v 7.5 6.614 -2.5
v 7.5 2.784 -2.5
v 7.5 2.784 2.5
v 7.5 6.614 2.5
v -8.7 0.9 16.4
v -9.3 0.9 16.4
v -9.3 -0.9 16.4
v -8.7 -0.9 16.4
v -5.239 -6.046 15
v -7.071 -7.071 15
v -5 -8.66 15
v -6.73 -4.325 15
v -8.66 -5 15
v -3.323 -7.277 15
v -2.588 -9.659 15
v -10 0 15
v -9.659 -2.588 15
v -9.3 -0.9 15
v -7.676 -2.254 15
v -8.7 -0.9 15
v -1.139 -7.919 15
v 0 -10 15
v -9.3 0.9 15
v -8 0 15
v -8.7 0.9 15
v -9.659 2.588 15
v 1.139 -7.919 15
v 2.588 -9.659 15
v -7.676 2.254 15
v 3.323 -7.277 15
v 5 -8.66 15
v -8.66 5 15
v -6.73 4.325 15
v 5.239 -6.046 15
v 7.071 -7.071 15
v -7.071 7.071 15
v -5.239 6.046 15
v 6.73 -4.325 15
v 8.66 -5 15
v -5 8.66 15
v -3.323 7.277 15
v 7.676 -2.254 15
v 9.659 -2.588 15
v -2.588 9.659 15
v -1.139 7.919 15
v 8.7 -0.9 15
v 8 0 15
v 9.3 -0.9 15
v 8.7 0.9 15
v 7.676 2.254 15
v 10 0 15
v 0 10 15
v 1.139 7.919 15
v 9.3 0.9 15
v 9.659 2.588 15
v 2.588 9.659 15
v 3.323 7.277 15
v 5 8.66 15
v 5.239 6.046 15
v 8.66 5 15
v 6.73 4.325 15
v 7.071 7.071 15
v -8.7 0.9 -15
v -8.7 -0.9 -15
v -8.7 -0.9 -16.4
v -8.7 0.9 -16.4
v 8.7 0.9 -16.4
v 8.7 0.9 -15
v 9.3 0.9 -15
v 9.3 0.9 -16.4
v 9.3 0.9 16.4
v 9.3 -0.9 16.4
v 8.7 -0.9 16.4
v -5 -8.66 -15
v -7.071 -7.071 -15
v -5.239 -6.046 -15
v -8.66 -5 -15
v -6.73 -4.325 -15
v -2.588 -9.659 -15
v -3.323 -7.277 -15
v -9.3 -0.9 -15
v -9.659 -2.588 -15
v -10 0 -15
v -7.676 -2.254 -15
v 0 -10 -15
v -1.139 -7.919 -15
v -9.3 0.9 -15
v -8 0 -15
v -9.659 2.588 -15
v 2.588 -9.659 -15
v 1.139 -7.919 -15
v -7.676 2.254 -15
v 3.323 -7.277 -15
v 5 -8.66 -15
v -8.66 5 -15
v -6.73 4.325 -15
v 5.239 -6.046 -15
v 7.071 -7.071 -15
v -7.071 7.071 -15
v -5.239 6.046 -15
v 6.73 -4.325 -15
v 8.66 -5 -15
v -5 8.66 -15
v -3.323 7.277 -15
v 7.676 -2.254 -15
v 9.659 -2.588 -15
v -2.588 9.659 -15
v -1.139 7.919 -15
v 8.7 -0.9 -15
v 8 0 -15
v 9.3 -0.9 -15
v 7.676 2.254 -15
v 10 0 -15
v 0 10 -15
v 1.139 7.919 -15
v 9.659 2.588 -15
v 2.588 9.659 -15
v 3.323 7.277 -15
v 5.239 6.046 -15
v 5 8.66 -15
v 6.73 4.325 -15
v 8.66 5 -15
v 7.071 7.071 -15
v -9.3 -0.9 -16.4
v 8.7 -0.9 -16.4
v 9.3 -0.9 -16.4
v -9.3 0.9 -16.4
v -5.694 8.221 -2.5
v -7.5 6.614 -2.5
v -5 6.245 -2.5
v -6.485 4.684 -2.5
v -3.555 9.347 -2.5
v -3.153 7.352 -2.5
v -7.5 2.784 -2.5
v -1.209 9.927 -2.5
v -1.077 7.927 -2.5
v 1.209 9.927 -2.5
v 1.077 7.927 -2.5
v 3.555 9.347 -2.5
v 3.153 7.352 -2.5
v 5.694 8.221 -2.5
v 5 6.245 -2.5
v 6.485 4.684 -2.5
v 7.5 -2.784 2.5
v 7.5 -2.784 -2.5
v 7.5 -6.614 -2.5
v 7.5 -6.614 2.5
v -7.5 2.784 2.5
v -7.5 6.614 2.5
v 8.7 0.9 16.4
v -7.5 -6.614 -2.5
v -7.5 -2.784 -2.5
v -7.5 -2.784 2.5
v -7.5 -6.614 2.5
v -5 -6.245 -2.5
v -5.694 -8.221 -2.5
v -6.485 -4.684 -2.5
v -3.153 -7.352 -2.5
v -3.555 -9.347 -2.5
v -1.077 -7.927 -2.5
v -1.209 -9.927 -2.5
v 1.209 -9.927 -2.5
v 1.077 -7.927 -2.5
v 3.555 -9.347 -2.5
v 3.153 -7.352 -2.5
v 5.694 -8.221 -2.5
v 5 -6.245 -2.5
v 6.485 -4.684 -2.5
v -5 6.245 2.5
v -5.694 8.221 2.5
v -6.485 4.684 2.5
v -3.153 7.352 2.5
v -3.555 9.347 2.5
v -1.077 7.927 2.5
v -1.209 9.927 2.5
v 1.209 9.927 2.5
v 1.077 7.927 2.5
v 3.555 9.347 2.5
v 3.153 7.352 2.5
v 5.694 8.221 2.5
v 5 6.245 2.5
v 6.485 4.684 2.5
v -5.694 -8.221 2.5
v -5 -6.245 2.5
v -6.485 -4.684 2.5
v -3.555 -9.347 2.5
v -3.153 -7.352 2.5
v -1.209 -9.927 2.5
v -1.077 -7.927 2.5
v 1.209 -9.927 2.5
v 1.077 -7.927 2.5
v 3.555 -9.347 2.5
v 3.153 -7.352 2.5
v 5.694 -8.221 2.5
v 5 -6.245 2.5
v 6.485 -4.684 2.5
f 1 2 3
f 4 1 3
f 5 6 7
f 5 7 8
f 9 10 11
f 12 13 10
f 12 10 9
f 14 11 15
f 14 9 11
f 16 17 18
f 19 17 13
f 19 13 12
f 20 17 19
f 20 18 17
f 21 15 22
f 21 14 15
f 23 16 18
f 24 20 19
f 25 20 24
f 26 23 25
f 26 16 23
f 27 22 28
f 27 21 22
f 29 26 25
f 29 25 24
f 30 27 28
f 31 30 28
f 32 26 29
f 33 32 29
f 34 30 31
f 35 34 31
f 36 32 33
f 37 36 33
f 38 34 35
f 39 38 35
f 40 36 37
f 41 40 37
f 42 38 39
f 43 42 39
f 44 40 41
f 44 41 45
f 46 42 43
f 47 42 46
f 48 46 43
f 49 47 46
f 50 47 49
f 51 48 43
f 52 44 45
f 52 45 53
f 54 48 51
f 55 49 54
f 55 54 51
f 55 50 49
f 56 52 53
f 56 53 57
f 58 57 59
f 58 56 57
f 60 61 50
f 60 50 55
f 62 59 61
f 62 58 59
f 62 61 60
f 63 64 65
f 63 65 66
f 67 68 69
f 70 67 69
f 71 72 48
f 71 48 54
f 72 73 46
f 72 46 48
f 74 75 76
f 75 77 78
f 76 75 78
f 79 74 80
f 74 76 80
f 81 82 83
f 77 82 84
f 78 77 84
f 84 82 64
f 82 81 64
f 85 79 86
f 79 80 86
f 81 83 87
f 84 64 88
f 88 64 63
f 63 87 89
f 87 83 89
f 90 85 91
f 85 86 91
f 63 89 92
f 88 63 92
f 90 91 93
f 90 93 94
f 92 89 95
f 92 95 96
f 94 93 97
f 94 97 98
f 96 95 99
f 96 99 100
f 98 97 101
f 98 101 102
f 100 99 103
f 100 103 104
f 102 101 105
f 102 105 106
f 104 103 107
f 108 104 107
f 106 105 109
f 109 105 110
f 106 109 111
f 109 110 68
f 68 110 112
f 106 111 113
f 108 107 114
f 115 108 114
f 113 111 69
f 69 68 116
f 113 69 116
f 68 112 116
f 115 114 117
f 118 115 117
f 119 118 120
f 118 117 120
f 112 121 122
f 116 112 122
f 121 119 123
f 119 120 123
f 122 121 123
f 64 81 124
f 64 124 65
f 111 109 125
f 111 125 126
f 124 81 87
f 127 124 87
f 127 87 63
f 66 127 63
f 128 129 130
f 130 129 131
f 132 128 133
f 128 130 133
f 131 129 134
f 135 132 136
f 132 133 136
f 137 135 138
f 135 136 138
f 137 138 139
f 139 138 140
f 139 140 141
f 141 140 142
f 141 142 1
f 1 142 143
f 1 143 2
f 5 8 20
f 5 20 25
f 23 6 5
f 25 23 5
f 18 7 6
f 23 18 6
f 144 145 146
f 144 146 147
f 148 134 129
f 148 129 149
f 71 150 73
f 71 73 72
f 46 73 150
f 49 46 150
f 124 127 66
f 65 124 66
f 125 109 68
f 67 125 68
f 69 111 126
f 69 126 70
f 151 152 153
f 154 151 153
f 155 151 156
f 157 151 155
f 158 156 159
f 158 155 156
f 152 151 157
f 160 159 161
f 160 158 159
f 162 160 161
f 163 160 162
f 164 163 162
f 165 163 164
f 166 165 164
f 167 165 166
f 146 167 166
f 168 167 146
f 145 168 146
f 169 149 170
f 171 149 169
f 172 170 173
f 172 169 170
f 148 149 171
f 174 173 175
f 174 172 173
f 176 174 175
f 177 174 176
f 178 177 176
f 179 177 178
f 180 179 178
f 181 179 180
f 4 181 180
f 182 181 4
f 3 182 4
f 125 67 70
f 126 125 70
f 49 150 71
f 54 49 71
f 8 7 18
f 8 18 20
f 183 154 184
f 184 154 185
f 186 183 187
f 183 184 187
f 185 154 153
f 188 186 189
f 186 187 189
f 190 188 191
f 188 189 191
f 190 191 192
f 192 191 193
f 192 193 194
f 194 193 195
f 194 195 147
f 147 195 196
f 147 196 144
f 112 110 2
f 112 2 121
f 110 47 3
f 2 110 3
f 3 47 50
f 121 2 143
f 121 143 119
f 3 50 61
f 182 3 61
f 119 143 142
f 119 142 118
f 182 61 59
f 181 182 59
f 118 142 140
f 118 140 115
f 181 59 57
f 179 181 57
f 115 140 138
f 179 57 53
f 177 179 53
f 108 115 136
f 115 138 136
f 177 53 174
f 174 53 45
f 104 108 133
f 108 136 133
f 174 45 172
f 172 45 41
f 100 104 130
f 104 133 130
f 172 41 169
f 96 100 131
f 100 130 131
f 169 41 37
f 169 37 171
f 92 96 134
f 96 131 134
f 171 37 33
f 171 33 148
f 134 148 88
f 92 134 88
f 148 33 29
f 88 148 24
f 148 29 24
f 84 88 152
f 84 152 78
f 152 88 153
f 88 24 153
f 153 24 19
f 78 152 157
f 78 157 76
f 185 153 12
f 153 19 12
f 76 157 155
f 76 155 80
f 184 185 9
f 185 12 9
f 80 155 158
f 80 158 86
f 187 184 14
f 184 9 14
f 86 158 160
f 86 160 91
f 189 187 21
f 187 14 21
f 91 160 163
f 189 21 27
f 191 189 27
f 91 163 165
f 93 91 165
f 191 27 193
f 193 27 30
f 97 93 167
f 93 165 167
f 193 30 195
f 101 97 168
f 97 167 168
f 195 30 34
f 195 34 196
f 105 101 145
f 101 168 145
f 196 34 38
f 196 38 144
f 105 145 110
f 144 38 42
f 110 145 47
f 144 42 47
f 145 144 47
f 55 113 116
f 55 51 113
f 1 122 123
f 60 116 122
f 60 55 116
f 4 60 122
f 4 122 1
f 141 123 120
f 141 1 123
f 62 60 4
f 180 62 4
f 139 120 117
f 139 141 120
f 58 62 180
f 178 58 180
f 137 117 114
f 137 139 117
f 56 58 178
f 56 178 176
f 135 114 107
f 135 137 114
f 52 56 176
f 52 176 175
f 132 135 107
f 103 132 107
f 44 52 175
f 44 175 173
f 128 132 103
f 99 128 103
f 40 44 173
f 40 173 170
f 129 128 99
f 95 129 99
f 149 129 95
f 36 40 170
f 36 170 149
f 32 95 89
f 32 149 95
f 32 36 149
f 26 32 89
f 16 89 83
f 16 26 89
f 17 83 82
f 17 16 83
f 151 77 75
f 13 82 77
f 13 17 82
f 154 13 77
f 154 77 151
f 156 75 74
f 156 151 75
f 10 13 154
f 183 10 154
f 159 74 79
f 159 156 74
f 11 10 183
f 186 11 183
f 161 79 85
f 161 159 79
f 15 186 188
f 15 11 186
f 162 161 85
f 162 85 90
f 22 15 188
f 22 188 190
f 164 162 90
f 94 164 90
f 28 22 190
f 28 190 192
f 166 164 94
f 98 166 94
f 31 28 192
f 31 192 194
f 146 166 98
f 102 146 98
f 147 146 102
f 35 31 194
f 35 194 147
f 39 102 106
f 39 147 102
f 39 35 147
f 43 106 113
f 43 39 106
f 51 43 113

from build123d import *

# Parameters (mm, degrees)
F0_W          = 0.6
F0_H          = 1.8
F1_DEPTH      = 16.4
F1_DEPTH_BACK = 16.4
F0_R          = 10
F0_R_2        = 8
F2_DEPTH      = 15
F2_DEPTH_BACK = 15
F3_W          = 15
F3_H          = 5
F4_DEPTH      = 20
F4_DEPTH_BACK = 20


with BuildPart() as f1:
    # F0 (on Top) → F1 (new body, two sides)
    with BuildSketch(Plane.XY) as f1_sk:
        with Locations((-9, 0)):
            Rectangle(F0_W, F0_H)
    extrude(amount=F1_DEPTH)
    extrude(f1_sk.sketch, amount=-F1_DEPTH_BACK)



with BuildPart() as f1b:
    # F0 (on Top) → F1, piece 2 (new body, two sides)
    with BuildSketch(Plane.XY) as f1_2_sk:
        with Locations((9, 0)):
            Rectangle(F0_W, F0_H)
    extrude(amount=F1_DEPTH)
    extrude(f1_2_sk.sketch, amount=-F1_DEPTH_BACK)


with BuildPart() as f1_1:
    add(f1.part)

    add(f1b.part)  # F2 merges F1b
    # F0 (on Top) → F2 (join, two sides)
    with BuildSketch(Plane.XY) as f2_sk:
        Circle(F0_R)
        with Locations((-9, 0)):
            Rectangle(F0_W, F0_H, mode=Mode.SUBTRACT)
        Circle(F0_R_2, mode=Mode.SUBTRACT)
        with Locations((9, 0)):
            Rectangle(F0_W, F0_H, mode=Mode.SUBTRACT)
    extrude(amount=F2_DEPTH)
    extrude(f2_sk.sketch, amount=-F2_DEPTH_BACK)

    # F3 (on Front) → F4 (cut, two sides)
    with BuildSketch(Plane.XZ) as f4_sk:
        Rectangle(F3_W, F3_H)
    extrude(amount=-F4_DEPTH, mode=Mode.SUBTRACT)
    extrude(f4_sk.sketch, amount=F4_DEPTH_BACK, mode=Mode.SUBTRACT)


solid = f1_1.part
